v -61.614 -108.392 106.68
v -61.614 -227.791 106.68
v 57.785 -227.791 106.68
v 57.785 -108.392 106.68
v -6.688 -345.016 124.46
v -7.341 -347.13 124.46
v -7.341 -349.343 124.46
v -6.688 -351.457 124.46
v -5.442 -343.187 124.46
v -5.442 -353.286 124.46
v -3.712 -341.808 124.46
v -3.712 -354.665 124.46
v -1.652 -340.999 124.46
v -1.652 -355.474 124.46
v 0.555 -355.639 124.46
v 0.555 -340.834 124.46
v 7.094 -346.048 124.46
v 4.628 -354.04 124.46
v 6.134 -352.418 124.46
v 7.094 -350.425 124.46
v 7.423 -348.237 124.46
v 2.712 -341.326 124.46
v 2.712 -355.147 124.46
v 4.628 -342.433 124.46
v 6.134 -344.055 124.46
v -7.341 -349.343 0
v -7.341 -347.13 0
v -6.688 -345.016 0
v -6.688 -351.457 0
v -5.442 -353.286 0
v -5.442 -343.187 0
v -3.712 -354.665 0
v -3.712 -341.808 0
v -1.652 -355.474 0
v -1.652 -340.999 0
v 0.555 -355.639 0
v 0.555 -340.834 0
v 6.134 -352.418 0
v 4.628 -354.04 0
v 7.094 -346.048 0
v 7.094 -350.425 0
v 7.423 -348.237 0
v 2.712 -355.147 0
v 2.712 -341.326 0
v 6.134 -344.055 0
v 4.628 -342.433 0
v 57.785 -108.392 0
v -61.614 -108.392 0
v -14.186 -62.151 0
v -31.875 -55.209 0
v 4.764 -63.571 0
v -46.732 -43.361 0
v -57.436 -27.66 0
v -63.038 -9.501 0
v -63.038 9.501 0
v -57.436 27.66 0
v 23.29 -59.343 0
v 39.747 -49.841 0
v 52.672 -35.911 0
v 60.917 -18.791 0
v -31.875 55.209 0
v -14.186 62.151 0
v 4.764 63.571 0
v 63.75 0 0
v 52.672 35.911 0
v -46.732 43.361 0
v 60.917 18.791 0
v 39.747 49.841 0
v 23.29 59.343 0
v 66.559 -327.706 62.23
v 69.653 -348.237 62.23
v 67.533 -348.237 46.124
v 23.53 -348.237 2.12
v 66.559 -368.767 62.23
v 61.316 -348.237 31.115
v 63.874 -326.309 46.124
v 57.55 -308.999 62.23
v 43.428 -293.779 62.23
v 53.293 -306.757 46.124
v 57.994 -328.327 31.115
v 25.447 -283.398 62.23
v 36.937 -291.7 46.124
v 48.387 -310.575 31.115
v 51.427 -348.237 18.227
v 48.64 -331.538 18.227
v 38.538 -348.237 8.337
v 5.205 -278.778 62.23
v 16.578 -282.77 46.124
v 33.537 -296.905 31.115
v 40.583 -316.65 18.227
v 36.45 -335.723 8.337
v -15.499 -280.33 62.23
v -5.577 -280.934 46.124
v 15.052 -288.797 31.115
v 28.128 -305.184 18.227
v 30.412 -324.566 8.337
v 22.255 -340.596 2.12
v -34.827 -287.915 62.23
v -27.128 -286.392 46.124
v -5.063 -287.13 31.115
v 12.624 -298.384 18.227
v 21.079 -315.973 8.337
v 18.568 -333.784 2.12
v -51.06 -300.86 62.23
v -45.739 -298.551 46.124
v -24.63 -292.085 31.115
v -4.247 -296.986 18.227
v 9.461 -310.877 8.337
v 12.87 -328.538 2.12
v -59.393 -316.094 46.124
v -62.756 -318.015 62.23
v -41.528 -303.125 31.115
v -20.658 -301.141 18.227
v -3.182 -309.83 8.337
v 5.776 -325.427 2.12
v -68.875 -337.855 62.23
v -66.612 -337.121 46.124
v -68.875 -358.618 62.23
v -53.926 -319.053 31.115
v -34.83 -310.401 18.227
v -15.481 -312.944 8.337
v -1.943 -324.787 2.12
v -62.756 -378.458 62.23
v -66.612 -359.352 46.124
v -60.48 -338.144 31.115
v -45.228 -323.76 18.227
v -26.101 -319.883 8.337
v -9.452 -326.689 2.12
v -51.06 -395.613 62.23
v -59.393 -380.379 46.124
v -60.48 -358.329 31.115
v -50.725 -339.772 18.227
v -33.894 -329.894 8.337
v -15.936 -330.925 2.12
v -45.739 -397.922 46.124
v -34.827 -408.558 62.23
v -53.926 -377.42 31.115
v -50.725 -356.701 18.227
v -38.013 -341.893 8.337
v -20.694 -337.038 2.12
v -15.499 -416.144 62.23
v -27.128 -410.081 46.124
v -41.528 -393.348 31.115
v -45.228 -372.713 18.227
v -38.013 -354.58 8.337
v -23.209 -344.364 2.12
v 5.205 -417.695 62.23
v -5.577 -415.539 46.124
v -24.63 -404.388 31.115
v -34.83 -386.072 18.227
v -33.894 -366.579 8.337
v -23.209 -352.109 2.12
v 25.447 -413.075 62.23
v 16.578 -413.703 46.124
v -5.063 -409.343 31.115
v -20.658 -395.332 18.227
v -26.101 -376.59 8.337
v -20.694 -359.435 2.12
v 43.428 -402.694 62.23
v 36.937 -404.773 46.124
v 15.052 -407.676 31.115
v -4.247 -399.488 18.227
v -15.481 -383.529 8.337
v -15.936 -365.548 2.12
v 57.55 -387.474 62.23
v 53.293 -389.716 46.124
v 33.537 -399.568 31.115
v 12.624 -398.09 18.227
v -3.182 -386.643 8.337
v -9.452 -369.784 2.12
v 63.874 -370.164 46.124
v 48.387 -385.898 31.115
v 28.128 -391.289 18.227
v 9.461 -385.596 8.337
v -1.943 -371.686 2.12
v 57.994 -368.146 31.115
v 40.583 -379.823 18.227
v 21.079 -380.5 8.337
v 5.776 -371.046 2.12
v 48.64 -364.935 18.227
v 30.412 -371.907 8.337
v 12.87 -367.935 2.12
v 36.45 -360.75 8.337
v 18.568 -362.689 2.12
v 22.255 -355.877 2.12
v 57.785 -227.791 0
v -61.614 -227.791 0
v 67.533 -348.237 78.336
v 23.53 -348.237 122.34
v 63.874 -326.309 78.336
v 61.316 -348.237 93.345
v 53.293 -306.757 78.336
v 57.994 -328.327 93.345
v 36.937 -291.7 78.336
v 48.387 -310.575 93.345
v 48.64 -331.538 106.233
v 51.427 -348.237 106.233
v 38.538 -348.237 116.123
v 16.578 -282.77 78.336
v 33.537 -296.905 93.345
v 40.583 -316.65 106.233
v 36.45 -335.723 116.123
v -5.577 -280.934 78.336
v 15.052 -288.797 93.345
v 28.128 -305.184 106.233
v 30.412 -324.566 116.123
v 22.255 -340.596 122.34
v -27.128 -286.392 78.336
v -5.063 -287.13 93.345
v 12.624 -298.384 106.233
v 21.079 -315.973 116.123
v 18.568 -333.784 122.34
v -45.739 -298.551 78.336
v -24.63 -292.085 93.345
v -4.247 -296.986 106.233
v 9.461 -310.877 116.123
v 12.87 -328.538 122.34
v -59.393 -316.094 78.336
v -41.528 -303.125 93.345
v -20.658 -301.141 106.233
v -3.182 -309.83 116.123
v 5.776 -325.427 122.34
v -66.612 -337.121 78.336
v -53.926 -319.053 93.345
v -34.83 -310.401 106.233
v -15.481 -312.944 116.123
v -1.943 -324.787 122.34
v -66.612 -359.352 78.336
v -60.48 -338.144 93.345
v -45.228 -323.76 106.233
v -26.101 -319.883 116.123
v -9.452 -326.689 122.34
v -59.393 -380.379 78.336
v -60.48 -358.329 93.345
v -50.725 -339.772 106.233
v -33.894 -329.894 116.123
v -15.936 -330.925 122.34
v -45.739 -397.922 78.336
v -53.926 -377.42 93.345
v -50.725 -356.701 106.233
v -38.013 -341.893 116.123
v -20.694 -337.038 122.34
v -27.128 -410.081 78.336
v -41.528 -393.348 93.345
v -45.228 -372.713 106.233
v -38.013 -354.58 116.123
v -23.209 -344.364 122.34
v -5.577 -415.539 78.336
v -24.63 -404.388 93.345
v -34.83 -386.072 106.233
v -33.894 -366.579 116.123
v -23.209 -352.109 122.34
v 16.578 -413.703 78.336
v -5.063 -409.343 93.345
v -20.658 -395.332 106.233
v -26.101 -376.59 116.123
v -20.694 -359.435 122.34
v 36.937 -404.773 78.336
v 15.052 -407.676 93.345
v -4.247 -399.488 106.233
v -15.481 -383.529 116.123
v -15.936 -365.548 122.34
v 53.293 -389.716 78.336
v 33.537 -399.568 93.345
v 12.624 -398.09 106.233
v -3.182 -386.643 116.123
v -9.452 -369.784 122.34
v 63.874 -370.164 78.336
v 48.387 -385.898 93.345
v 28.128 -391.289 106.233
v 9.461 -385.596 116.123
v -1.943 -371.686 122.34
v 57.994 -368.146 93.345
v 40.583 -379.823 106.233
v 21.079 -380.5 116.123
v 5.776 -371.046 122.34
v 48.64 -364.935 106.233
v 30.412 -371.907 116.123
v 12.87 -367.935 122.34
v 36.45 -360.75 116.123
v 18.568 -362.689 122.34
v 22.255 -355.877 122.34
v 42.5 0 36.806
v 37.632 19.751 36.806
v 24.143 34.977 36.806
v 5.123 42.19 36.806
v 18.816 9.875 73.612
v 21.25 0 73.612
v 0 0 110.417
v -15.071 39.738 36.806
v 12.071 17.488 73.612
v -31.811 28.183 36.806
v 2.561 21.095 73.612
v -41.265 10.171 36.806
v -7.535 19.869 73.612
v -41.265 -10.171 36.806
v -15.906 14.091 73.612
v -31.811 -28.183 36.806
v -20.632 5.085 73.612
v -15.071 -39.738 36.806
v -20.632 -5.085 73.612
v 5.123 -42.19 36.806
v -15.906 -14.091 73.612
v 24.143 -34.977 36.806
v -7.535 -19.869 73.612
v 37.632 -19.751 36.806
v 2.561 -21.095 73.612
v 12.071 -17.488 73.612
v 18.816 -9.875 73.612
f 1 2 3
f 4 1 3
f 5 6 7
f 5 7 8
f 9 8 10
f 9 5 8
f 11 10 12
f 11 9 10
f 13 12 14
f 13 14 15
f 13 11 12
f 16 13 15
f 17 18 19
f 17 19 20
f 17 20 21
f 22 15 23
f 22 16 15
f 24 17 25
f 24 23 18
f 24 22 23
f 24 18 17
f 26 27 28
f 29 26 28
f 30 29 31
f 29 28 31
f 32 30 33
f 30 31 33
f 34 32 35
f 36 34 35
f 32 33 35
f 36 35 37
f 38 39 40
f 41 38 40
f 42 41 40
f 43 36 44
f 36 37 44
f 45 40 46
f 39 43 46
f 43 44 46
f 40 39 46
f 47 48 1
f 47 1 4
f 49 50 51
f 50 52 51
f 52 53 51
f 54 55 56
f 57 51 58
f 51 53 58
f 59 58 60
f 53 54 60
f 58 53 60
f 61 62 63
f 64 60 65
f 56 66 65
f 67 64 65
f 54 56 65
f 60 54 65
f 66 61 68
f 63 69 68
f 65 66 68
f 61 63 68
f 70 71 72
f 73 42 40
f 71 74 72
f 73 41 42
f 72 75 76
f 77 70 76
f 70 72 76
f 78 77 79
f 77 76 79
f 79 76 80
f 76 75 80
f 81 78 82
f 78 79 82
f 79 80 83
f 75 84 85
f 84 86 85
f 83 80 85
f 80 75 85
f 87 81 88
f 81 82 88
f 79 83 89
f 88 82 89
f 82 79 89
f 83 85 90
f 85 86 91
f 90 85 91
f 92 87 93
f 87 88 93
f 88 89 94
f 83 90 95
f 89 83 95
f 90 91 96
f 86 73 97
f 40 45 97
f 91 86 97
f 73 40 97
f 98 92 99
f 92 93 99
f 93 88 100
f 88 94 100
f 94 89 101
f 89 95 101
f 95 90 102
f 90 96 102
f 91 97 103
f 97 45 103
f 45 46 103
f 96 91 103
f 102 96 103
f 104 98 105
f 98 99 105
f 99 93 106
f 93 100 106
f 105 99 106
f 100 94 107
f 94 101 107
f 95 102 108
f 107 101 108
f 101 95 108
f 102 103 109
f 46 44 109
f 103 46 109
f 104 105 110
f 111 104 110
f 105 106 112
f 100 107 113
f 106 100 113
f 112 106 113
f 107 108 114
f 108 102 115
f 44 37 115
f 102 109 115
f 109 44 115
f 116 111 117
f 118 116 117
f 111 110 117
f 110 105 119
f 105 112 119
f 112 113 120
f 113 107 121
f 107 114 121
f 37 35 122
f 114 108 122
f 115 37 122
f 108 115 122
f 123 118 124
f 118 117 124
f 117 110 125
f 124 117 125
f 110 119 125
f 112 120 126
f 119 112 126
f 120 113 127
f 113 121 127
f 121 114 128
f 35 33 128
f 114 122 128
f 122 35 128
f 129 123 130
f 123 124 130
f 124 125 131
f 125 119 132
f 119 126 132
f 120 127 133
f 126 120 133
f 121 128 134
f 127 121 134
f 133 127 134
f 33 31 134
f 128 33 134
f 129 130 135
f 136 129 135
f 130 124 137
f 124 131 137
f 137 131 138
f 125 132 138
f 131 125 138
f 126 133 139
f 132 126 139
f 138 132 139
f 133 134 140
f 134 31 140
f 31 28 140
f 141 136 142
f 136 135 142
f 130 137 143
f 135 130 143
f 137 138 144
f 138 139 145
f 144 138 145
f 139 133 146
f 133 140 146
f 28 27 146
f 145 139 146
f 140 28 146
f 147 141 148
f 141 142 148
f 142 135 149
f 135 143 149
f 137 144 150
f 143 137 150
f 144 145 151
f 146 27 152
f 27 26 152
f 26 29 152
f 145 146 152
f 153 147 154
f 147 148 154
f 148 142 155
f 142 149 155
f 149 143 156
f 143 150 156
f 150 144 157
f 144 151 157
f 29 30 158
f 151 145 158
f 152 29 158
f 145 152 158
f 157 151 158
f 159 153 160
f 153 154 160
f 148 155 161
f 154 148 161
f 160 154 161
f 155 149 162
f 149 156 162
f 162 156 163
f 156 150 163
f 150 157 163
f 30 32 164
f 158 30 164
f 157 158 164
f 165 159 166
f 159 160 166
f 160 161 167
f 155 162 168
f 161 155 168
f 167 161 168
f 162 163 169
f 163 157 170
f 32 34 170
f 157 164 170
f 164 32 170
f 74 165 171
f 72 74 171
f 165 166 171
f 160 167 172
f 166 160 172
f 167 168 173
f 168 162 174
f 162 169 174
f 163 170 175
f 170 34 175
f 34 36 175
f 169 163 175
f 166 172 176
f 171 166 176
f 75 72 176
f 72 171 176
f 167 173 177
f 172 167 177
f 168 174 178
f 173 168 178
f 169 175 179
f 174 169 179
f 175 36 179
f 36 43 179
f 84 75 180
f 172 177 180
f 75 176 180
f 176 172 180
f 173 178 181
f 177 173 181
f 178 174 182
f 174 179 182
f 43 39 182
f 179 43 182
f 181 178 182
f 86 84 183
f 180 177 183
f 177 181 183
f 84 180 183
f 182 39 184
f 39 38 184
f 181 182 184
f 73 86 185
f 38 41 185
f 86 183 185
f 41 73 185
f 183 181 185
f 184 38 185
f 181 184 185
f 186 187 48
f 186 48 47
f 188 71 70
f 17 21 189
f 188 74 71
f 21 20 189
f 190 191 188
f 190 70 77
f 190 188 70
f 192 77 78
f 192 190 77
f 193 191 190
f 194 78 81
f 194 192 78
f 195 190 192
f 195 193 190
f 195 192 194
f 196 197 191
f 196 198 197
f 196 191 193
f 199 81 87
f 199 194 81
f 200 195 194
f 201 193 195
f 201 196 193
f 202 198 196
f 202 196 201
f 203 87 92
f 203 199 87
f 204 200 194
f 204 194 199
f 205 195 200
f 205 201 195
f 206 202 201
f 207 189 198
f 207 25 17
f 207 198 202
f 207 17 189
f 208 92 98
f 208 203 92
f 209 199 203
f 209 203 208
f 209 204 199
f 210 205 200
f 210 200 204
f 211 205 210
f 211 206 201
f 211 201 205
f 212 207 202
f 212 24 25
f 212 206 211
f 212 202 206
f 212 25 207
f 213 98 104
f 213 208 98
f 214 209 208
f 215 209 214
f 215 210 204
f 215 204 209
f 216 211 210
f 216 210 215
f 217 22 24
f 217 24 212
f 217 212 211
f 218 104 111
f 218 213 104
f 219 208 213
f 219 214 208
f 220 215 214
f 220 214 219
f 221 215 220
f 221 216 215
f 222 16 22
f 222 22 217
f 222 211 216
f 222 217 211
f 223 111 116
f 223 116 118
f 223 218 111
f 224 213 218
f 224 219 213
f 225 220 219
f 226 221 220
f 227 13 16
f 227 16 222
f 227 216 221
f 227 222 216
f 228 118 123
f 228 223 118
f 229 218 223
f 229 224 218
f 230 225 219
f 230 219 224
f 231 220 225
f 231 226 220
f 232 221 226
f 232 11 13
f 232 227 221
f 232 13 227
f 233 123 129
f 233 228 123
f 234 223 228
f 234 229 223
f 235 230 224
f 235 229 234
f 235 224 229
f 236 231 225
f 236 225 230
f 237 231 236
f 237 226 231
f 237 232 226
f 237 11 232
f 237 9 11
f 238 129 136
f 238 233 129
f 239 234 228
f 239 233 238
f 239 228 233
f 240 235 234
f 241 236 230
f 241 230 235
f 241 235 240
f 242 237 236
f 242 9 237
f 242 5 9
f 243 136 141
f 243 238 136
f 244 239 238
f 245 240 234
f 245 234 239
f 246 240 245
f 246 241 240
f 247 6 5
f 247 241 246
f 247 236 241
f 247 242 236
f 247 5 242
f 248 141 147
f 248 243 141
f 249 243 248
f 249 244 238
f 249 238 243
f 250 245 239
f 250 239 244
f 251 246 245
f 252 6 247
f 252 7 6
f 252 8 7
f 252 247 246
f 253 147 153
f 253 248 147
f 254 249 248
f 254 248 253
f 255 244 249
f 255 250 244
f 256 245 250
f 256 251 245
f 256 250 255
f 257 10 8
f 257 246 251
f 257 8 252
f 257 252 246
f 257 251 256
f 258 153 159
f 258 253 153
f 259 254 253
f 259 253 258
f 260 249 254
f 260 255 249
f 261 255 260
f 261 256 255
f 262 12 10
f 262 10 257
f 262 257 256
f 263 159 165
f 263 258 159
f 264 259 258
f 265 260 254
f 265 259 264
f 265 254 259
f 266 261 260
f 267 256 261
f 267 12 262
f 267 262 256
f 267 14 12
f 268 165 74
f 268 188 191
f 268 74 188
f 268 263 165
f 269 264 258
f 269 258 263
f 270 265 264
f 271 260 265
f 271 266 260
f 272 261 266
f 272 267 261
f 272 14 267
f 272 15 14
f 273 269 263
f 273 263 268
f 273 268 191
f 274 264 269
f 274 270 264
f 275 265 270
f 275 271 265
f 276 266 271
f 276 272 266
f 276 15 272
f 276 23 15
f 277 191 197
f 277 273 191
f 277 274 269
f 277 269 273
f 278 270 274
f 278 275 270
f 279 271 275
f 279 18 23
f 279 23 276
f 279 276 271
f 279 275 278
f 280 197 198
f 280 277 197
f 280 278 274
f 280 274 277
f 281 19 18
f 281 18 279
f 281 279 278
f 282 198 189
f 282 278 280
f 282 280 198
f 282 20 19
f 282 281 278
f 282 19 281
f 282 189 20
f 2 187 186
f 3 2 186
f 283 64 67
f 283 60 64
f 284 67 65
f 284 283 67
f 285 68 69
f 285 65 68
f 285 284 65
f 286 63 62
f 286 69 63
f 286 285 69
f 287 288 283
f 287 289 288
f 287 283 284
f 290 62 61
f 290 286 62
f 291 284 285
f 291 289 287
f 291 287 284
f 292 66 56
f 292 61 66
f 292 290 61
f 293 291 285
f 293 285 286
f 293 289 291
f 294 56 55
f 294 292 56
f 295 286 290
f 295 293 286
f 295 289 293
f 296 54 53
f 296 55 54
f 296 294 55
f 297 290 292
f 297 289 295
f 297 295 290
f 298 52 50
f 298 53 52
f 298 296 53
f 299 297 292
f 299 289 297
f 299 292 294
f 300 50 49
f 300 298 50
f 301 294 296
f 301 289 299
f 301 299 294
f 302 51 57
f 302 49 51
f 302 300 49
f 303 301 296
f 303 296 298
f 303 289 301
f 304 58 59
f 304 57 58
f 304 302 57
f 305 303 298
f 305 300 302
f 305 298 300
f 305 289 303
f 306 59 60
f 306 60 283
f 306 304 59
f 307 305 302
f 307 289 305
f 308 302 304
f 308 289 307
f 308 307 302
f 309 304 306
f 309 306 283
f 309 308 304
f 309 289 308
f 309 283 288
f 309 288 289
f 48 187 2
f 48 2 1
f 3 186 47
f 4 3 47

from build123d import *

# Parameters (mm, degrees)
F0_R     = 63.7495375214
F1_DEPTH = 153.67
F1_TAPER = 30
F2_W     = 119.3985827267
F2_H     = 119.398586452
F3_DEPTH = 106.68
F4_R     = 69.6534055832
F5_DEPTH = 124.46
F6_R     = 62.22999


# Not quite as in the source:
# - a fillet or chamfer is up to 0.001 mm smaller than in the source, because OpenCascade refuses the exact size


with BuildPart() as f1:
    # F0 (on Top) → F1 (new body)
    with BuildSketch(Plane.XY):
        Circle(F0_R)
    extrude(amount=F1_DEPTH, taper=F1_TAPER)


with BuildPart() as f3:
    # F2 (on Top) → F3 (new body)
    with BuildSketch(Plane.XY):
        with Locations((-1.9145961851, -168.0913157761)):
            Rectangle(F2_W, F2_H)
    extrude(amount=F3_DEPTH)


with BuildPart() as f5:
    # F4 (on Top) → F5 (new body)
    with BuildSketch(Plane.XY):
        with Locations((0, -348.2365608215)):
            Circle(F4_R)
    extrude(amount=F5_DEPTH)

    # F6 (radius 62.23 in the source; OpenCascade refuses exactly that, so slightly less here)
    f6_edges = [f5.edges().sort_by_distance(p)[0] for p in [
        (-69.653406, -348.236561, 0),
        (-69.653406, -348.236561, 124.46),
    ]]
    fillet(f6_edges, radius=F6_R)


solid = Compound([f1.part, f3.part, f5.part])
